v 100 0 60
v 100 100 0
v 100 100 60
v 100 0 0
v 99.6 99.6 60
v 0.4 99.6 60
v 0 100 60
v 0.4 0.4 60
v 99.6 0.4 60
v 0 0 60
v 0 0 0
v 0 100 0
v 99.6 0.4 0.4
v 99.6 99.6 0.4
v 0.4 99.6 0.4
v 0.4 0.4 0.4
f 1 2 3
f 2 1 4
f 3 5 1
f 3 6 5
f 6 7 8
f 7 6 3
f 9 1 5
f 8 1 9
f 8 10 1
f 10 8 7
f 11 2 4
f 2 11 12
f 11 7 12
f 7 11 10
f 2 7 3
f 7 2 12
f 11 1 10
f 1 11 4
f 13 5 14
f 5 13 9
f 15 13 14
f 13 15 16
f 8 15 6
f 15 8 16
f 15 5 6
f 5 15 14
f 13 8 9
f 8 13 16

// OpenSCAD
thickness = 0.4;

difference() {
	cube([100, 100, 60]);
	translate([thickness, thickness, thickness]) {
		cube([100 - thickness * 2, 100 - thickness * 2, 100]);
	}
}
